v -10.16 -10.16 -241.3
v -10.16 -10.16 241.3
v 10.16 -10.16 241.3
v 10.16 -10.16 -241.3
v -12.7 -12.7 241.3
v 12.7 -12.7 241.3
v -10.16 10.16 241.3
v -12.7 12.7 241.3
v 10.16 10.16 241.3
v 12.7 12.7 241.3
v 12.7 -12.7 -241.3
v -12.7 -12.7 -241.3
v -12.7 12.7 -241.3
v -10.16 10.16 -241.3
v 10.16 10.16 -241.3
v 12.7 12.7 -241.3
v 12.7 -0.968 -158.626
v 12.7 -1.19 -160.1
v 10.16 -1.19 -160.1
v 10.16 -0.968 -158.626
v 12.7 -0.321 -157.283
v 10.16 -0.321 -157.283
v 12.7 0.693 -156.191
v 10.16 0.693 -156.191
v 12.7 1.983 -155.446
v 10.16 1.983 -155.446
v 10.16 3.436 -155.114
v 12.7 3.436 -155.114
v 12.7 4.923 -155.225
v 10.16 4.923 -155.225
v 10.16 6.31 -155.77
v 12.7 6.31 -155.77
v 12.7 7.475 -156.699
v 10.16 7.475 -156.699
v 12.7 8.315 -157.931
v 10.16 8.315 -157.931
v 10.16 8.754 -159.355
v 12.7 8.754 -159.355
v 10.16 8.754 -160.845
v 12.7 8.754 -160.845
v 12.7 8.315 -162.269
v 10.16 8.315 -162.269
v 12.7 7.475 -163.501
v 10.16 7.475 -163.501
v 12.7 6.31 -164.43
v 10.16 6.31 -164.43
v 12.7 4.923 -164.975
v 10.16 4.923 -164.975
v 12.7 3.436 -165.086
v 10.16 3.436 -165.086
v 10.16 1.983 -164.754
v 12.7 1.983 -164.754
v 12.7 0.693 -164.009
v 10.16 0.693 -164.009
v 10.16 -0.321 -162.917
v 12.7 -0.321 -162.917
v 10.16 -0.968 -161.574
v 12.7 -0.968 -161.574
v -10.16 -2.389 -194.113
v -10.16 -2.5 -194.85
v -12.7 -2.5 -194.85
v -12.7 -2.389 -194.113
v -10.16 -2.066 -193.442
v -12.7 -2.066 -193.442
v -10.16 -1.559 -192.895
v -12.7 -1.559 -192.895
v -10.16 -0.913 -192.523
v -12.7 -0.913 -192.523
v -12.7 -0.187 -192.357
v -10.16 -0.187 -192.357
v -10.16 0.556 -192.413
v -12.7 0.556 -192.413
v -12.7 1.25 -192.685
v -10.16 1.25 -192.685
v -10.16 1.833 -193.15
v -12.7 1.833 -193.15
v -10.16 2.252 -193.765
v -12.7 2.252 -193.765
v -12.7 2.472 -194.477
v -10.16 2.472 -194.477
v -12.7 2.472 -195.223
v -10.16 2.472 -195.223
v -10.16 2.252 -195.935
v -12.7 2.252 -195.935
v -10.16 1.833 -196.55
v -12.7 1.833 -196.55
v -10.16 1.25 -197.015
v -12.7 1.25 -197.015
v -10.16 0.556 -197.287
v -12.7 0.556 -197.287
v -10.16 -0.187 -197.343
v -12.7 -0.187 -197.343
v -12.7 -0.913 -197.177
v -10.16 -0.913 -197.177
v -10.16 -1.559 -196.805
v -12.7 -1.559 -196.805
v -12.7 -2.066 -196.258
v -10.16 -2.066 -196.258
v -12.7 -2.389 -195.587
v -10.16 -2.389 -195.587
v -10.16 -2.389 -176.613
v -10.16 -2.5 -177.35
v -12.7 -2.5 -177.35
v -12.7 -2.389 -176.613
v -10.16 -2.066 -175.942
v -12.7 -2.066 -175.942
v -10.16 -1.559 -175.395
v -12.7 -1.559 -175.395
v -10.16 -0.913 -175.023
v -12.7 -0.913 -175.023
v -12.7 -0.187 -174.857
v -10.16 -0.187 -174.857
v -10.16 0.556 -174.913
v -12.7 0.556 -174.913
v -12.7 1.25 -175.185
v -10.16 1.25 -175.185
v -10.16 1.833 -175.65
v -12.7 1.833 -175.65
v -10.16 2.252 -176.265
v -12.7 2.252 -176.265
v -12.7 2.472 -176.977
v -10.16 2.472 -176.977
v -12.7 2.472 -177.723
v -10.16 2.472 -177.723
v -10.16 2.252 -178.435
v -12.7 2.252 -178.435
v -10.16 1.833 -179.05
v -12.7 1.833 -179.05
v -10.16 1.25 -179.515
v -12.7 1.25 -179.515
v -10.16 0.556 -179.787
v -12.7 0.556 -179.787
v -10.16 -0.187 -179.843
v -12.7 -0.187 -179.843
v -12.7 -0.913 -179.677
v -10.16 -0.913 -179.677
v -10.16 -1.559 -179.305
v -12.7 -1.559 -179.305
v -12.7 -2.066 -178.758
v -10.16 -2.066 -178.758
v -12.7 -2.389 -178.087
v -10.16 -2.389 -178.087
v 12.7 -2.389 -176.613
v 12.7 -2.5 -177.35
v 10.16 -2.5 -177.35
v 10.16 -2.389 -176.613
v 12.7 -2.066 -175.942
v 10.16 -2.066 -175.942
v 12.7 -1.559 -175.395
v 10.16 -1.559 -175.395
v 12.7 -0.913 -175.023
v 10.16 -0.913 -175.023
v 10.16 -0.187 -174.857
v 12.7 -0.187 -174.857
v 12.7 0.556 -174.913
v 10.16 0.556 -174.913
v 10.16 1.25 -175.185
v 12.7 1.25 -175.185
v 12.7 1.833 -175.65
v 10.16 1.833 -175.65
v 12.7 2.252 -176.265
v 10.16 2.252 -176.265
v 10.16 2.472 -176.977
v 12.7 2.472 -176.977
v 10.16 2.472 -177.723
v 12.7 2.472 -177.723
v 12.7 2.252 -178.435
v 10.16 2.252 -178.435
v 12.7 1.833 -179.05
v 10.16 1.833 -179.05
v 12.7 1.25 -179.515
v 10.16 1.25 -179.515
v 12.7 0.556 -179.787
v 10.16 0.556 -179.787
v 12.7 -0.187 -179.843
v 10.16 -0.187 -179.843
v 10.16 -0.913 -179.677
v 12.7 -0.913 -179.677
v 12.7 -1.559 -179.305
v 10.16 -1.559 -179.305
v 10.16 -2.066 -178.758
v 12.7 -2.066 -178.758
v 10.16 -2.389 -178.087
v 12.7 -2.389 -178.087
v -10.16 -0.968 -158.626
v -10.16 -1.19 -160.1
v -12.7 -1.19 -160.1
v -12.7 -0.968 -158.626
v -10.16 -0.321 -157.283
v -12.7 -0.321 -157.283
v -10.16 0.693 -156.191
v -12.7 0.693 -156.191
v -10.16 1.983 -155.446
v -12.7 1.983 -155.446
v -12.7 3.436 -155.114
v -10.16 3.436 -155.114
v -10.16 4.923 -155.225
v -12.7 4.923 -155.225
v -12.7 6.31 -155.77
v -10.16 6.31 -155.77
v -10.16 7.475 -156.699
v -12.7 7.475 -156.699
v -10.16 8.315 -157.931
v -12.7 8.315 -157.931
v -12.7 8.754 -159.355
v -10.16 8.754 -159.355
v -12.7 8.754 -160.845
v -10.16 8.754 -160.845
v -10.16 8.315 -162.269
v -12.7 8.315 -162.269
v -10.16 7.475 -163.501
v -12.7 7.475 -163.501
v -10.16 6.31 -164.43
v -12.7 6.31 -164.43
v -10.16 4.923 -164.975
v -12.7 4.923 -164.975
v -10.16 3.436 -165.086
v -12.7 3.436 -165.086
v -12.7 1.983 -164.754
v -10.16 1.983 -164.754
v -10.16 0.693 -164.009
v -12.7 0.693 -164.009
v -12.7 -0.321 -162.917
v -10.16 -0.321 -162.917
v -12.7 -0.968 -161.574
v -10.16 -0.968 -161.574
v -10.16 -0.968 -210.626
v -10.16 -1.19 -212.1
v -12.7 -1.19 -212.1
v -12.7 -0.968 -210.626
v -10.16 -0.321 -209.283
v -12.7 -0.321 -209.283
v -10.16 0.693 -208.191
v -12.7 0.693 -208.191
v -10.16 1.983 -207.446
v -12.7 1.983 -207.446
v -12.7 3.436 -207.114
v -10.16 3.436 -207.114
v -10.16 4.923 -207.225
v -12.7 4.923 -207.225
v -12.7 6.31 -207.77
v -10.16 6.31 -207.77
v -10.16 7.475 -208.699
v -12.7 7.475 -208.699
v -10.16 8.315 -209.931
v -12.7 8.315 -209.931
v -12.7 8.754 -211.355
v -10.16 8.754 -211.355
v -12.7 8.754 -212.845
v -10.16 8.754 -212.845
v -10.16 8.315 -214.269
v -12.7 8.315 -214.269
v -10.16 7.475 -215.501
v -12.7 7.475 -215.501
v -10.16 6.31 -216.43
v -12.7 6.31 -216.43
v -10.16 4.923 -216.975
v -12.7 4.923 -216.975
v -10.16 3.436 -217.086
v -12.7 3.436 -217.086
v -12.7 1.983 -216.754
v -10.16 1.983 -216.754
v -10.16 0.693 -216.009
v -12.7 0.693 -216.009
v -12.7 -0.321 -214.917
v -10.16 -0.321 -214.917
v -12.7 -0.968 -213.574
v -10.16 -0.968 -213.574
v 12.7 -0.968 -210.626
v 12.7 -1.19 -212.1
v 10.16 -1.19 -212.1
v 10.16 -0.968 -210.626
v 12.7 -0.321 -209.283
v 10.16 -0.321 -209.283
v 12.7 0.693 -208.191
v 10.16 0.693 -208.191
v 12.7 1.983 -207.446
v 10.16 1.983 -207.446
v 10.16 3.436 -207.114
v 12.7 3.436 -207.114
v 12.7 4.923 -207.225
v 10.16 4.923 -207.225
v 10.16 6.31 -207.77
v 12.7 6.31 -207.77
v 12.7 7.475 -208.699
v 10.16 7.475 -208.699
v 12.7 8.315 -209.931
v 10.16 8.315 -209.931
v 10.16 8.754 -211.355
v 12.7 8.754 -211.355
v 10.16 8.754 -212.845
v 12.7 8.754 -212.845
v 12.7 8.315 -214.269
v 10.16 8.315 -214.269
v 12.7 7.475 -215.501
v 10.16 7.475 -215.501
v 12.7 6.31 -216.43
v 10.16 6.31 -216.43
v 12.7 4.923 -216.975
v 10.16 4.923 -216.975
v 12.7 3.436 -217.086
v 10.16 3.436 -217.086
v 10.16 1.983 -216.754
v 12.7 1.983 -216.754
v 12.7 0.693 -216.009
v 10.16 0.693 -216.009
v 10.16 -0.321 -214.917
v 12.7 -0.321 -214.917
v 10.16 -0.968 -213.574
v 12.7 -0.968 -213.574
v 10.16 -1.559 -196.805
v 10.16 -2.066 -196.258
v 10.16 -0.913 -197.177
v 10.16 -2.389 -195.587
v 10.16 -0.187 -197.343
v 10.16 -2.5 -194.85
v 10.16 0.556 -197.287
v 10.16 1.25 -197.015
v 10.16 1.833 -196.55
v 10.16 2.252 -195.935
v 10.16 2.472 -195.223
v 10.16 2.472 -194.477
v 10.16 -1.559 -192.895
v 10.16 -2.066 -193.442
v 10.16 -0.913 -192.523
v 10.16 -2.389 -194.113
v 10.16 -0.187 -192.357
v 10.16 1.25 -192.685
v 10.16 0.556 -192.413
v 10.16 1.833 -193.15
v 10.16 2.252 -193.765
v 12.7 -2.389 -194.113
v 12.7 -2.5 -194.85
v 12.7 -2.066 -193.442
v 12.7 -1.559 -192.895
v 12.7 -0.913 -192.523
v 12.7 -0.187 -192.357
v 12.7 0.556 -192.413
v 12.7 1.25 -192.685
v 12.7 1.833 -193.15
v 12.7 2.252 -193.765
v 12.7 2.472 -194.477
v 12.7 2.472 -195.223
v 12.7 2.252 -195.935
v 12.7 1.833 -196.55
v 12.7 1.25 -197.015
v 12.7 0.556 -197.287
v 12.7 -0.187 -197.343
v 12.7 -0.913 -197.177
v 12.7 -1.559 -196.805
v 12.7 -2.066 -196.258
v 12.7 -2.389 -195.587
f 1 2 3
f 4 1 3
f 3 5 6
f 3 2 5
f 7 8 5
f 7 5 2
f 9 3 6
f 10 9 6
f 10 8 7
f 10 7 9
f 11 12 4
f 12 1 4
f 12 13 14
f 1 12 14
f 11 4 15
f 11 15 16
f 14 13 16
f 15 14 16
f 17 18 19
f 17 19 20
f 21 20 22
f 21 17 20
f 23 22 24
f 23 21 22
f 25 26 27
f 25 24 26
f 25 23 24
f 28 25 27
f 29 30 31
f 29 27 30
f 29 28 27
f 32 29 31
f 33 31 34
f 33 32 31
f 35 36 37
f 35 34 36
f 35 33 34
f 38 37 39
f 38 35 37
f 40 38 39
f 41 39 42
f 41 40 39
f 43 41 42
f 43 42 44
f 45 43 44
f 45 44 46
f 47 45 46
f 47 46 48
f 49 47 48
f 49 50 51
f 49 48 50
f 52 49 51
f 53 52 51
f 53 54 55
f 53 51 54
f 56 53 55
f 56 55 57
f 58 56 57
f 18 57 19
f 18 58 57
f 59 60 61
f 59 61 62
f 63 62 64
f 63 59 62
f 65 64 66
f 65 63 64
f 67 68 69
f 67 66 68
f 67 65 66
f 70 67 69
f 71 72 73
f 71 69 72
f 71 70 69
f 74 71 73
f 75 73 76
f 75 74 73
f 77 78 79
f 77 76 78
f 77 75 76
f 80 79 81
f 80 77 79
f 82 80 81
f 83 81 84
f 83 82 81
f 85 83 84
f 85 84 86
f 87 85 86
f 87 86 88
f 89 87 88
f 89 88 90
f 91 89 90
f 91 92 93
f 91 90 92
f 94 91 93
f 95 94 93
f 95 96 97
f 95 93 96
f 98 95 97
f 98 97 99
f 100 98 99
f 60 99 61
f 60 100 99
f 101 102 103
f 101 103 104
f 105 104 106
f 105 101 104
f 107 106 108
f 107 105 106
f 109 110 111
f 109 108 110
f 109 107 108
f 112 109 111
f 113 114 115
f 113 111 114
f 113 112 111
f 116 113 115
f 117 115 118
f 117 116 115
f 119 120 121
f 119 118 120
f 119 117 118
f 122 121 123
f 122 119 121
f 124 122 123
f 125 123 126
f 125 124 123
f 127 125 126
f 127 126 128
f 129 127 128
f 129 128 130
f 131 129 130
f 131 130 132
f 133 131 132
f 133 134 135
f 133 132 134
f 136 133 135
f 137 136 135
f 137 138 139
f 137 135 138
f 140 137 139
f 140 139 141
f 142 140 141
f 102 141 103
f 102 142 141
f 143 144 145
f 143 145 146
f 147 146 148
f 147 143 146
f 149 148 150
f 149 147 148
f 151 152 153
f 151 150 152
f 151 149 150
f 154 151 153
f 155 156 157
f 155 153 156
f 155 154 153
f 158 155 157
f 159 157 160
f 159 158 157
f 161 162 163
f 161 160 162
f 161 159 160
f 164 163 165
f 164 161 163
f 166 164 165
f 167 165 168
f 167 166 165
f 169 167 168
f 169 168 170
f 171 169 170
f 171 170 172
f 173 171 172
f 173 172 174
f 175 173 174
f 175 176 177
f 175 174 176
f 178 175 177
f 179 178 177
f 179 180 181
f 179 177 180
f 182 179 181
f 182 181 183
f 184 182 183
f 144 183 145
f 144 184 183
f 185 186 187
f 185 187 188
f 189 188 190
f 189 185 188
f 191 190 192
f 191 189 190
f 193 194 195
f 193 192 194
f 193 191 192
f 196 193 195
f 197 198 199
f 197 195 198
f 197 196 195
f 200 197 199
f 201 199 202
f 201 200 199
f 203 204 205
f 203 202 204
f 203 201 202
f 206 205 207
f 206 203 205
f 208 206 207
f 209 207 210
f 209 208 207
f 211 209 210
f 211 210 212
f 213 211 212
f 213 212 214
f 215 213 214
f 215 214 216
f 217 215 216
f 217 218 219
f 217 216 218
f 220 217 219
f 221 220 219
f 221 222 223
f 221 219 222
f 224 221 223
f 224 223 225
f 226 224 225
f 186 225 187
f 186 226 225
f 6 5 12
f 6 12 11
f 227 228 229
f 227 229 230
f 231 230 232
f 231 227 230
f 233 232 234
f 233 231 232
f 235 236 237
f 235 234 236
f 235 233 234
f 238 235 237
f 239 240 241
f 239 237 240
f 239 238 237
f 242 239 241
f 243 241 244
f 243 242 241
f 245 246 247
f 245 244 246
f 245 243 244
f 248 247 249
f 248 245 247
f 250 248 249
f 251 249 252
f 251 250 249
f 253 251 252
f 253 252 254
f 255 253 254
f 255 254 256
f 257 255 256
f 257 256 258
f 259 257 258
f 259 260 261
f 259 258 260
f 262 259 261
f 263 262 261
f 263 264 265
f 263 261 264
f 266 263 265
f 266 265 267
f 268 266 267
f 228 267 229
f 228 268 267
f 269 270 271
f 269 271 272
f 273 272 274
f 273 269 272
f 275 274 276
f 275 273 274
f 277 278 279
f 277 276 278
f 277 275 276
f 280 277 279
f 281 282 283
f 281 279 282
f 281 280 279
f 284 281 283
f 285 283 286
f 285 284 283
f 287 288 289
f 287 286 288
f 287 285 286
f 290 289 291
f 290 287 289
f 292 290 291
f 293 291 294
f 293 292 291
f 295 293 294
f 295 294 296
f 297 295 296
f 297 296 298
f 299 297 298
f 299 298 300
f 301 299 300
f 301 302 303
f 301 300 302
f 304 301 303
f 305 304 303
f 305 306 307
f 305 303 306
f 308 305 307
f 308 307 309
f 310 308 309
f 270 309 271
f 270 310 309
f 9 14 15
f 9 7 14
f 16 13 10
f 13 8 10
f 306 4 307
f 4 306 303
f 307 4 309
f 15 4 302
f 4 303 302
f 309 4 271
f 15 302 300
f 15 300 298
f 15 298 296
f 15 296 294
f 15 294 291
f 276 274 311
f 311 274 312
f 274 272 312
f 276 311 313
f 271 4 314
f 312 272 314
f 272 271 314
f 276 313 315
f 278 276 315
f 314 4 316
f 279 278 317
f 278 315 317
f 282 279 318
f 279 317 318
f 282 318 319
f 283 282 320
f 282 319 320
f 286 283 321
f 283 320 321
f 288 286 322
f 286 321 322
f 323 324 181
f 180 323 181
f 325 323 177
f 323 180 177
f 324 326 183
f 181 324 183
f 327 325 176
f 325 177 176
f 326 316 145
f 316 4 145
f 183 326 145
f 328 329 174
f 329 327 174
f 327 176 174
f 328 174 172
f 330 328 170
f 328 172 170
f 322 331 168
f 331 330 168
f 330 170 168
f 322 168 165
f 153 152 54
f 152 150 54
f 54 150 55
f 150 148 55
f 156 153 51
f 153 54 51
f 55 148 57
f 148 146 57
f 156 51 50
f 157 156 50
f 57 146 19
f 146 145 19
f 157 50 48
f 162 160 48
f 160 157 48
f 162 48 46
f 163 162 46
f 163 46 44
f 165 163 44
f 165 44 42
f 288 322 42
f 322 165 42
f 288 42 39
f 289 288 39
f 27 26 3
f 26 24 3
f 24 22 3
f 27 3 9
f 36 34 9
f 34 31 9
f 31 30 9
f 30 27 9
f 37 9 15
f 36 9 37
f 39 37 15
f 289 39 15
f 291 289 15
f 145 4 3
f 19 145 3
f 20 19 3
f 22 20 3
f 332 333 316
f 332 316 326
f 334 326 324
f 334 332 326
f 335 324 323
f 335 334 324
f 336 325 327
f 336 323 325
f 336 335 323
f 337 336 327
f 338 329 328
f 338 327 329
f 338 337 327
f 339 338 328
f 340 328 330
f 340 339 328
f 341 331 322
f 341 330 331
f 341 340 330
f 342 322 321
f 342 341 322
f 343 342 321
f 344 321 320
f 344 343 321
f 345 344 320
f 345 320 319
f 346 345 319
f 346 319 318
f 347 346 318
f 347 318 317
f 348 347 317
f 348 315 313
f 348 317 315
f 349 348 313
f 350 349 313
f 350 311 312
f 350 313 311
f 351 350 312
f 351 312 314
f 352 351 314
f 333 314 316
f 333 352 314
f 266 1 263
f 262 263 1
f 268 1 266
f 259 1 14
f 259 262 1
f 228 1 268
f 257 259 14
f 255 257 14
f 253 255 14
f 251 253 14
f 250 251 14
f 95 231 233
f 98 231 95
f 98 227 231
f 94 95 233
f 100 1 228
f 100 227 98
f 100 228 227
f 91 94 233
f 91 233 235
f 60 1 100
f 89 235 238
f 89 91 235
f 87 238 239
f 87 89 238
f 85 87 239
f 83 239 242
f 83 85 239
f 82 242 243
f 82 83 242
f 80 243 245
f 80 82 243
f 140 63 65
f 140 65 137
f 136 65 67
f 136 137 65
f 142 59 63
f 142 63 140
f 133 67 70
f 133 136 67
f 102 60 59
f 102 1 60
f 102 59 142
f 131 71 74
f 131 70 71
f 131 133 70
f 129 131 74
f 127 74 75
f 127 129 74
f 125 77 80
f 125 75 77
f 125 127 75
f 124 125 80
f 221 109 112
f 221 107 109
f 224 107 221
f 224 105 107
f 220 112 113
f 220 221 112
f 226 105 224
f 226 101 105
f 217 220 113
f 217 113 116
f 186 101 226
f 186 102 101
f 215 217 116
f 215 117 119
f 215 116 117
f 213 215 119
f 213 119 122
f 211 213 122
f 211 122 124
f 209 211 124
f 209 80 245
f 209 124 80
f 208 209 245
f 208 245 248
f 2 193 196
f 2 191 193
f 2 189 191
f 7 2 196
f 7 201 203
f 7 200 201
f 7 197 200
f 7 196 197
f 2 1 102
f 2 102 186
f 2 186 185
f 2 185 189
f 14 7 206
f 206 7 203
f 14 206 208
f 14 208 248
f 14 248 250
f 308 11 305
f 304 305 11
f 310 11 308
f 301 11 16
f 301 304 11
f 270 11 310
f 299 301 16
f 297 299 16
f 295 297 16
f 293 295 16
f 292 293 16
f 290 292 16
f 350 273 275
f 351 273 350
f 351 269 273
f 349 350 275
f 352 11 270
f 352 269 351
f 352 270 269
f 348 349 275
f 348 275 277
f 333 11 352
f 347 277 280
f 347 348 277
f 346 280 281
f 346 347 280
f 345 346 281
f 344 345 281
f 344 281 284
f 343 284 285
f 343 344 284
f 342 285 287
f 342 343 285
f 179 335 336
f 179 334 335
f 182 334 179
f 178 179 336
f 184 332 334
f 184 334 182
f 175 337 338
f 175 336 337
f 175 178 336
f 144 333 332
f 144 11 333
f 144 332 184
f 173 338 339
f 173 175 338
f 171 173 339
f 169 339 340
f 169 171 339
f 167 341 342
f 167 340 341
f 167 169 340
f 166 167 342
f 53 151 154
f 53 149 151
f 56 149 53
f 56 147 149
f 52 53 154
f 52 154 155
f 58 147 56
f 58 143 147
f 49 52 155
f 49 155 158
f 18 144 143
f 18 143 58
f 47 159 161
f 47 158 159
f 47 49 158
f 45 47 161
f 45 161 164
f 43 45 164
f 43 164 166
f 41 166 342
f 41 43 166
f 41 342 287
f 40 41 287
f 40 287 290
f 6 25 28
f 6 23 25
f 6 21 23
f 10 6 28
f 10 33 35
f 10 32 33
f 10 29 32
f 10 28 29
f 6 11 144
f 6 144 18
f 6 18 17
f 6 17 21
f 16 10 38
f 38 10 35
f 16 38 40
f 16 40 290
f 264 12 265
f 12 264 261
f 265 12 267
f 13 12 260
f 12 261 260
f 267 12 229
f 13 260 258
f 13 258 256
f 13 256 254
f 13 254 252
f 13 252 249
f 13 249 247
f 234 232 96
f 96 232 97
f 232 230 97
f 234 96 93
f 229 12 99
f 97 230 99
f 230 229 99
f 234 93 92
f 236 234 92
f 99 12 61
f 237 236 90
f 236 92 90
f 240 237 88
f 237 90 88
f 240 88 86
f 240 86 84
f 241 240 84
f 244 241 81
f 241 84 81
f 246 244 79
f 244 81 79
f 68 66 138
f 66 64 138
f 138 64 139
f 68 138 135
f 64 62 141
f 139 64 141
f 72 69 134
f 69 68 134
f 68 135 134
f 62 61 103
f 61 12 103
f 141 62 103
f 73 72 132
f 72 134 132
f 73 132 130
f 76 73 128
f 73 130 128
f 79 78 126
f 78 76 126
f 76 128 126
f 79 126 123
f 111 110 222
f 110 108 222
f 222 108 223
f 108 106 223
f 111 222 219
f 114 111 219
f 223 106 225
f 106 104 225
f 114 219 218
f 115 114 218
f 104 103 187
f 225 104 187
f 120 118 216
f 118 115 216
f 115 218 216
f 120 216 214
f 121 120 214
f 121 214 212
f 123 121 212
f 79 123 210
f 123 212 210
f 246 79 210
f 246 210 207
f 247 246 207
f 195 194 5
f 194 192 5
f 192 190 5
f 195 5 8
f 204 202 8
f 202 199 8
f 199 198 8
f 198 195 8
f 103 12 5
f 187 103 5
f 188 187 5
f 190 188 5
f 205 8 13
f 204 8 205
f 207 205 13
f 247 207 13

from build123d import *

# Parameters (mm, degrees)
SKETCH1_W               = 25.4
SKETCH1_H               = 25.4
SKETCH1_W_2             = 20.32
SKETCH1_H_2             = 20.32
BOSS_EXTRUDE1_DEPTH     = 241.3
CUT_EXTRUDE1_DEPTH      = 243.965306165
CUT_EXTRUDE1_DEPTH_BACK = 243.965306165
SKETCH2_R               = 5
CUT_EXTRUDE3_DEPTH      = 243.965306165
CUT_EXTRUDE3_DEPTH_BACK = 243.965306165
SKETCH5_R               = 2.5


with BuildPart() as part:
    # Sketch1 → Boss-Extrude1 (new, symmetric)
    with BuildSketch(Plane.XY):
        Rectangle(SKETCH1_W, SKETCH1_H)
        Rectangle(SKETCH1_W_2, SKETCH1_H_2, mode=Mode.SUBTRACT)
    extrude(amount=BOSS_EXTRUDE1_DEPTH, both=True)

    # Sketch2 → Cut-Extrude1 (cut, two sides: drawn at the far end of the back side and taken through both)
    with BuildSketch(Plane.ZY.offset(12.7).offset(-CUT_EXTRUDE1_DEPTH_BACK)):
        with Locations(Location((-212.1, 3.81, 0), (0, 0, 270))):
            Circle(SKETCH2_R)
        with Locations(Location((-160.1, 3.81, 0), (0, 0, 270))):
            Circle(SKETCH2_R)
    extrude(amount=CUT_EXTRUDE1_DEPTH + CUT_EXTRUDE1_DEPTH_BACK, mode=Mode.SUBTRACT)

    # Sketch5 → Cut-Extrude3 (cut, two sides: drawn at the far end of the back side and taken through both)
    with BuildSketch(Plane.ZY.offset(12.7).offset(-CUT_EXTRUDE3_DEPTH_BACK)):
        with Locations(Location((-194.85, 0, 0), (0, 0, 270))):
            Circle(SKETCH5_R)
        with Locations(Location((-177.35, 0, 0), (0, 0, 270))):
            Circle(SKETCH5_R)
    extrude(amount=CUT_EXTRUDE3_DEPTH + CUT_EXTRUDE3_DEPTH_BACK, mode=Mode.SUBTRACT)


solid = part.part
